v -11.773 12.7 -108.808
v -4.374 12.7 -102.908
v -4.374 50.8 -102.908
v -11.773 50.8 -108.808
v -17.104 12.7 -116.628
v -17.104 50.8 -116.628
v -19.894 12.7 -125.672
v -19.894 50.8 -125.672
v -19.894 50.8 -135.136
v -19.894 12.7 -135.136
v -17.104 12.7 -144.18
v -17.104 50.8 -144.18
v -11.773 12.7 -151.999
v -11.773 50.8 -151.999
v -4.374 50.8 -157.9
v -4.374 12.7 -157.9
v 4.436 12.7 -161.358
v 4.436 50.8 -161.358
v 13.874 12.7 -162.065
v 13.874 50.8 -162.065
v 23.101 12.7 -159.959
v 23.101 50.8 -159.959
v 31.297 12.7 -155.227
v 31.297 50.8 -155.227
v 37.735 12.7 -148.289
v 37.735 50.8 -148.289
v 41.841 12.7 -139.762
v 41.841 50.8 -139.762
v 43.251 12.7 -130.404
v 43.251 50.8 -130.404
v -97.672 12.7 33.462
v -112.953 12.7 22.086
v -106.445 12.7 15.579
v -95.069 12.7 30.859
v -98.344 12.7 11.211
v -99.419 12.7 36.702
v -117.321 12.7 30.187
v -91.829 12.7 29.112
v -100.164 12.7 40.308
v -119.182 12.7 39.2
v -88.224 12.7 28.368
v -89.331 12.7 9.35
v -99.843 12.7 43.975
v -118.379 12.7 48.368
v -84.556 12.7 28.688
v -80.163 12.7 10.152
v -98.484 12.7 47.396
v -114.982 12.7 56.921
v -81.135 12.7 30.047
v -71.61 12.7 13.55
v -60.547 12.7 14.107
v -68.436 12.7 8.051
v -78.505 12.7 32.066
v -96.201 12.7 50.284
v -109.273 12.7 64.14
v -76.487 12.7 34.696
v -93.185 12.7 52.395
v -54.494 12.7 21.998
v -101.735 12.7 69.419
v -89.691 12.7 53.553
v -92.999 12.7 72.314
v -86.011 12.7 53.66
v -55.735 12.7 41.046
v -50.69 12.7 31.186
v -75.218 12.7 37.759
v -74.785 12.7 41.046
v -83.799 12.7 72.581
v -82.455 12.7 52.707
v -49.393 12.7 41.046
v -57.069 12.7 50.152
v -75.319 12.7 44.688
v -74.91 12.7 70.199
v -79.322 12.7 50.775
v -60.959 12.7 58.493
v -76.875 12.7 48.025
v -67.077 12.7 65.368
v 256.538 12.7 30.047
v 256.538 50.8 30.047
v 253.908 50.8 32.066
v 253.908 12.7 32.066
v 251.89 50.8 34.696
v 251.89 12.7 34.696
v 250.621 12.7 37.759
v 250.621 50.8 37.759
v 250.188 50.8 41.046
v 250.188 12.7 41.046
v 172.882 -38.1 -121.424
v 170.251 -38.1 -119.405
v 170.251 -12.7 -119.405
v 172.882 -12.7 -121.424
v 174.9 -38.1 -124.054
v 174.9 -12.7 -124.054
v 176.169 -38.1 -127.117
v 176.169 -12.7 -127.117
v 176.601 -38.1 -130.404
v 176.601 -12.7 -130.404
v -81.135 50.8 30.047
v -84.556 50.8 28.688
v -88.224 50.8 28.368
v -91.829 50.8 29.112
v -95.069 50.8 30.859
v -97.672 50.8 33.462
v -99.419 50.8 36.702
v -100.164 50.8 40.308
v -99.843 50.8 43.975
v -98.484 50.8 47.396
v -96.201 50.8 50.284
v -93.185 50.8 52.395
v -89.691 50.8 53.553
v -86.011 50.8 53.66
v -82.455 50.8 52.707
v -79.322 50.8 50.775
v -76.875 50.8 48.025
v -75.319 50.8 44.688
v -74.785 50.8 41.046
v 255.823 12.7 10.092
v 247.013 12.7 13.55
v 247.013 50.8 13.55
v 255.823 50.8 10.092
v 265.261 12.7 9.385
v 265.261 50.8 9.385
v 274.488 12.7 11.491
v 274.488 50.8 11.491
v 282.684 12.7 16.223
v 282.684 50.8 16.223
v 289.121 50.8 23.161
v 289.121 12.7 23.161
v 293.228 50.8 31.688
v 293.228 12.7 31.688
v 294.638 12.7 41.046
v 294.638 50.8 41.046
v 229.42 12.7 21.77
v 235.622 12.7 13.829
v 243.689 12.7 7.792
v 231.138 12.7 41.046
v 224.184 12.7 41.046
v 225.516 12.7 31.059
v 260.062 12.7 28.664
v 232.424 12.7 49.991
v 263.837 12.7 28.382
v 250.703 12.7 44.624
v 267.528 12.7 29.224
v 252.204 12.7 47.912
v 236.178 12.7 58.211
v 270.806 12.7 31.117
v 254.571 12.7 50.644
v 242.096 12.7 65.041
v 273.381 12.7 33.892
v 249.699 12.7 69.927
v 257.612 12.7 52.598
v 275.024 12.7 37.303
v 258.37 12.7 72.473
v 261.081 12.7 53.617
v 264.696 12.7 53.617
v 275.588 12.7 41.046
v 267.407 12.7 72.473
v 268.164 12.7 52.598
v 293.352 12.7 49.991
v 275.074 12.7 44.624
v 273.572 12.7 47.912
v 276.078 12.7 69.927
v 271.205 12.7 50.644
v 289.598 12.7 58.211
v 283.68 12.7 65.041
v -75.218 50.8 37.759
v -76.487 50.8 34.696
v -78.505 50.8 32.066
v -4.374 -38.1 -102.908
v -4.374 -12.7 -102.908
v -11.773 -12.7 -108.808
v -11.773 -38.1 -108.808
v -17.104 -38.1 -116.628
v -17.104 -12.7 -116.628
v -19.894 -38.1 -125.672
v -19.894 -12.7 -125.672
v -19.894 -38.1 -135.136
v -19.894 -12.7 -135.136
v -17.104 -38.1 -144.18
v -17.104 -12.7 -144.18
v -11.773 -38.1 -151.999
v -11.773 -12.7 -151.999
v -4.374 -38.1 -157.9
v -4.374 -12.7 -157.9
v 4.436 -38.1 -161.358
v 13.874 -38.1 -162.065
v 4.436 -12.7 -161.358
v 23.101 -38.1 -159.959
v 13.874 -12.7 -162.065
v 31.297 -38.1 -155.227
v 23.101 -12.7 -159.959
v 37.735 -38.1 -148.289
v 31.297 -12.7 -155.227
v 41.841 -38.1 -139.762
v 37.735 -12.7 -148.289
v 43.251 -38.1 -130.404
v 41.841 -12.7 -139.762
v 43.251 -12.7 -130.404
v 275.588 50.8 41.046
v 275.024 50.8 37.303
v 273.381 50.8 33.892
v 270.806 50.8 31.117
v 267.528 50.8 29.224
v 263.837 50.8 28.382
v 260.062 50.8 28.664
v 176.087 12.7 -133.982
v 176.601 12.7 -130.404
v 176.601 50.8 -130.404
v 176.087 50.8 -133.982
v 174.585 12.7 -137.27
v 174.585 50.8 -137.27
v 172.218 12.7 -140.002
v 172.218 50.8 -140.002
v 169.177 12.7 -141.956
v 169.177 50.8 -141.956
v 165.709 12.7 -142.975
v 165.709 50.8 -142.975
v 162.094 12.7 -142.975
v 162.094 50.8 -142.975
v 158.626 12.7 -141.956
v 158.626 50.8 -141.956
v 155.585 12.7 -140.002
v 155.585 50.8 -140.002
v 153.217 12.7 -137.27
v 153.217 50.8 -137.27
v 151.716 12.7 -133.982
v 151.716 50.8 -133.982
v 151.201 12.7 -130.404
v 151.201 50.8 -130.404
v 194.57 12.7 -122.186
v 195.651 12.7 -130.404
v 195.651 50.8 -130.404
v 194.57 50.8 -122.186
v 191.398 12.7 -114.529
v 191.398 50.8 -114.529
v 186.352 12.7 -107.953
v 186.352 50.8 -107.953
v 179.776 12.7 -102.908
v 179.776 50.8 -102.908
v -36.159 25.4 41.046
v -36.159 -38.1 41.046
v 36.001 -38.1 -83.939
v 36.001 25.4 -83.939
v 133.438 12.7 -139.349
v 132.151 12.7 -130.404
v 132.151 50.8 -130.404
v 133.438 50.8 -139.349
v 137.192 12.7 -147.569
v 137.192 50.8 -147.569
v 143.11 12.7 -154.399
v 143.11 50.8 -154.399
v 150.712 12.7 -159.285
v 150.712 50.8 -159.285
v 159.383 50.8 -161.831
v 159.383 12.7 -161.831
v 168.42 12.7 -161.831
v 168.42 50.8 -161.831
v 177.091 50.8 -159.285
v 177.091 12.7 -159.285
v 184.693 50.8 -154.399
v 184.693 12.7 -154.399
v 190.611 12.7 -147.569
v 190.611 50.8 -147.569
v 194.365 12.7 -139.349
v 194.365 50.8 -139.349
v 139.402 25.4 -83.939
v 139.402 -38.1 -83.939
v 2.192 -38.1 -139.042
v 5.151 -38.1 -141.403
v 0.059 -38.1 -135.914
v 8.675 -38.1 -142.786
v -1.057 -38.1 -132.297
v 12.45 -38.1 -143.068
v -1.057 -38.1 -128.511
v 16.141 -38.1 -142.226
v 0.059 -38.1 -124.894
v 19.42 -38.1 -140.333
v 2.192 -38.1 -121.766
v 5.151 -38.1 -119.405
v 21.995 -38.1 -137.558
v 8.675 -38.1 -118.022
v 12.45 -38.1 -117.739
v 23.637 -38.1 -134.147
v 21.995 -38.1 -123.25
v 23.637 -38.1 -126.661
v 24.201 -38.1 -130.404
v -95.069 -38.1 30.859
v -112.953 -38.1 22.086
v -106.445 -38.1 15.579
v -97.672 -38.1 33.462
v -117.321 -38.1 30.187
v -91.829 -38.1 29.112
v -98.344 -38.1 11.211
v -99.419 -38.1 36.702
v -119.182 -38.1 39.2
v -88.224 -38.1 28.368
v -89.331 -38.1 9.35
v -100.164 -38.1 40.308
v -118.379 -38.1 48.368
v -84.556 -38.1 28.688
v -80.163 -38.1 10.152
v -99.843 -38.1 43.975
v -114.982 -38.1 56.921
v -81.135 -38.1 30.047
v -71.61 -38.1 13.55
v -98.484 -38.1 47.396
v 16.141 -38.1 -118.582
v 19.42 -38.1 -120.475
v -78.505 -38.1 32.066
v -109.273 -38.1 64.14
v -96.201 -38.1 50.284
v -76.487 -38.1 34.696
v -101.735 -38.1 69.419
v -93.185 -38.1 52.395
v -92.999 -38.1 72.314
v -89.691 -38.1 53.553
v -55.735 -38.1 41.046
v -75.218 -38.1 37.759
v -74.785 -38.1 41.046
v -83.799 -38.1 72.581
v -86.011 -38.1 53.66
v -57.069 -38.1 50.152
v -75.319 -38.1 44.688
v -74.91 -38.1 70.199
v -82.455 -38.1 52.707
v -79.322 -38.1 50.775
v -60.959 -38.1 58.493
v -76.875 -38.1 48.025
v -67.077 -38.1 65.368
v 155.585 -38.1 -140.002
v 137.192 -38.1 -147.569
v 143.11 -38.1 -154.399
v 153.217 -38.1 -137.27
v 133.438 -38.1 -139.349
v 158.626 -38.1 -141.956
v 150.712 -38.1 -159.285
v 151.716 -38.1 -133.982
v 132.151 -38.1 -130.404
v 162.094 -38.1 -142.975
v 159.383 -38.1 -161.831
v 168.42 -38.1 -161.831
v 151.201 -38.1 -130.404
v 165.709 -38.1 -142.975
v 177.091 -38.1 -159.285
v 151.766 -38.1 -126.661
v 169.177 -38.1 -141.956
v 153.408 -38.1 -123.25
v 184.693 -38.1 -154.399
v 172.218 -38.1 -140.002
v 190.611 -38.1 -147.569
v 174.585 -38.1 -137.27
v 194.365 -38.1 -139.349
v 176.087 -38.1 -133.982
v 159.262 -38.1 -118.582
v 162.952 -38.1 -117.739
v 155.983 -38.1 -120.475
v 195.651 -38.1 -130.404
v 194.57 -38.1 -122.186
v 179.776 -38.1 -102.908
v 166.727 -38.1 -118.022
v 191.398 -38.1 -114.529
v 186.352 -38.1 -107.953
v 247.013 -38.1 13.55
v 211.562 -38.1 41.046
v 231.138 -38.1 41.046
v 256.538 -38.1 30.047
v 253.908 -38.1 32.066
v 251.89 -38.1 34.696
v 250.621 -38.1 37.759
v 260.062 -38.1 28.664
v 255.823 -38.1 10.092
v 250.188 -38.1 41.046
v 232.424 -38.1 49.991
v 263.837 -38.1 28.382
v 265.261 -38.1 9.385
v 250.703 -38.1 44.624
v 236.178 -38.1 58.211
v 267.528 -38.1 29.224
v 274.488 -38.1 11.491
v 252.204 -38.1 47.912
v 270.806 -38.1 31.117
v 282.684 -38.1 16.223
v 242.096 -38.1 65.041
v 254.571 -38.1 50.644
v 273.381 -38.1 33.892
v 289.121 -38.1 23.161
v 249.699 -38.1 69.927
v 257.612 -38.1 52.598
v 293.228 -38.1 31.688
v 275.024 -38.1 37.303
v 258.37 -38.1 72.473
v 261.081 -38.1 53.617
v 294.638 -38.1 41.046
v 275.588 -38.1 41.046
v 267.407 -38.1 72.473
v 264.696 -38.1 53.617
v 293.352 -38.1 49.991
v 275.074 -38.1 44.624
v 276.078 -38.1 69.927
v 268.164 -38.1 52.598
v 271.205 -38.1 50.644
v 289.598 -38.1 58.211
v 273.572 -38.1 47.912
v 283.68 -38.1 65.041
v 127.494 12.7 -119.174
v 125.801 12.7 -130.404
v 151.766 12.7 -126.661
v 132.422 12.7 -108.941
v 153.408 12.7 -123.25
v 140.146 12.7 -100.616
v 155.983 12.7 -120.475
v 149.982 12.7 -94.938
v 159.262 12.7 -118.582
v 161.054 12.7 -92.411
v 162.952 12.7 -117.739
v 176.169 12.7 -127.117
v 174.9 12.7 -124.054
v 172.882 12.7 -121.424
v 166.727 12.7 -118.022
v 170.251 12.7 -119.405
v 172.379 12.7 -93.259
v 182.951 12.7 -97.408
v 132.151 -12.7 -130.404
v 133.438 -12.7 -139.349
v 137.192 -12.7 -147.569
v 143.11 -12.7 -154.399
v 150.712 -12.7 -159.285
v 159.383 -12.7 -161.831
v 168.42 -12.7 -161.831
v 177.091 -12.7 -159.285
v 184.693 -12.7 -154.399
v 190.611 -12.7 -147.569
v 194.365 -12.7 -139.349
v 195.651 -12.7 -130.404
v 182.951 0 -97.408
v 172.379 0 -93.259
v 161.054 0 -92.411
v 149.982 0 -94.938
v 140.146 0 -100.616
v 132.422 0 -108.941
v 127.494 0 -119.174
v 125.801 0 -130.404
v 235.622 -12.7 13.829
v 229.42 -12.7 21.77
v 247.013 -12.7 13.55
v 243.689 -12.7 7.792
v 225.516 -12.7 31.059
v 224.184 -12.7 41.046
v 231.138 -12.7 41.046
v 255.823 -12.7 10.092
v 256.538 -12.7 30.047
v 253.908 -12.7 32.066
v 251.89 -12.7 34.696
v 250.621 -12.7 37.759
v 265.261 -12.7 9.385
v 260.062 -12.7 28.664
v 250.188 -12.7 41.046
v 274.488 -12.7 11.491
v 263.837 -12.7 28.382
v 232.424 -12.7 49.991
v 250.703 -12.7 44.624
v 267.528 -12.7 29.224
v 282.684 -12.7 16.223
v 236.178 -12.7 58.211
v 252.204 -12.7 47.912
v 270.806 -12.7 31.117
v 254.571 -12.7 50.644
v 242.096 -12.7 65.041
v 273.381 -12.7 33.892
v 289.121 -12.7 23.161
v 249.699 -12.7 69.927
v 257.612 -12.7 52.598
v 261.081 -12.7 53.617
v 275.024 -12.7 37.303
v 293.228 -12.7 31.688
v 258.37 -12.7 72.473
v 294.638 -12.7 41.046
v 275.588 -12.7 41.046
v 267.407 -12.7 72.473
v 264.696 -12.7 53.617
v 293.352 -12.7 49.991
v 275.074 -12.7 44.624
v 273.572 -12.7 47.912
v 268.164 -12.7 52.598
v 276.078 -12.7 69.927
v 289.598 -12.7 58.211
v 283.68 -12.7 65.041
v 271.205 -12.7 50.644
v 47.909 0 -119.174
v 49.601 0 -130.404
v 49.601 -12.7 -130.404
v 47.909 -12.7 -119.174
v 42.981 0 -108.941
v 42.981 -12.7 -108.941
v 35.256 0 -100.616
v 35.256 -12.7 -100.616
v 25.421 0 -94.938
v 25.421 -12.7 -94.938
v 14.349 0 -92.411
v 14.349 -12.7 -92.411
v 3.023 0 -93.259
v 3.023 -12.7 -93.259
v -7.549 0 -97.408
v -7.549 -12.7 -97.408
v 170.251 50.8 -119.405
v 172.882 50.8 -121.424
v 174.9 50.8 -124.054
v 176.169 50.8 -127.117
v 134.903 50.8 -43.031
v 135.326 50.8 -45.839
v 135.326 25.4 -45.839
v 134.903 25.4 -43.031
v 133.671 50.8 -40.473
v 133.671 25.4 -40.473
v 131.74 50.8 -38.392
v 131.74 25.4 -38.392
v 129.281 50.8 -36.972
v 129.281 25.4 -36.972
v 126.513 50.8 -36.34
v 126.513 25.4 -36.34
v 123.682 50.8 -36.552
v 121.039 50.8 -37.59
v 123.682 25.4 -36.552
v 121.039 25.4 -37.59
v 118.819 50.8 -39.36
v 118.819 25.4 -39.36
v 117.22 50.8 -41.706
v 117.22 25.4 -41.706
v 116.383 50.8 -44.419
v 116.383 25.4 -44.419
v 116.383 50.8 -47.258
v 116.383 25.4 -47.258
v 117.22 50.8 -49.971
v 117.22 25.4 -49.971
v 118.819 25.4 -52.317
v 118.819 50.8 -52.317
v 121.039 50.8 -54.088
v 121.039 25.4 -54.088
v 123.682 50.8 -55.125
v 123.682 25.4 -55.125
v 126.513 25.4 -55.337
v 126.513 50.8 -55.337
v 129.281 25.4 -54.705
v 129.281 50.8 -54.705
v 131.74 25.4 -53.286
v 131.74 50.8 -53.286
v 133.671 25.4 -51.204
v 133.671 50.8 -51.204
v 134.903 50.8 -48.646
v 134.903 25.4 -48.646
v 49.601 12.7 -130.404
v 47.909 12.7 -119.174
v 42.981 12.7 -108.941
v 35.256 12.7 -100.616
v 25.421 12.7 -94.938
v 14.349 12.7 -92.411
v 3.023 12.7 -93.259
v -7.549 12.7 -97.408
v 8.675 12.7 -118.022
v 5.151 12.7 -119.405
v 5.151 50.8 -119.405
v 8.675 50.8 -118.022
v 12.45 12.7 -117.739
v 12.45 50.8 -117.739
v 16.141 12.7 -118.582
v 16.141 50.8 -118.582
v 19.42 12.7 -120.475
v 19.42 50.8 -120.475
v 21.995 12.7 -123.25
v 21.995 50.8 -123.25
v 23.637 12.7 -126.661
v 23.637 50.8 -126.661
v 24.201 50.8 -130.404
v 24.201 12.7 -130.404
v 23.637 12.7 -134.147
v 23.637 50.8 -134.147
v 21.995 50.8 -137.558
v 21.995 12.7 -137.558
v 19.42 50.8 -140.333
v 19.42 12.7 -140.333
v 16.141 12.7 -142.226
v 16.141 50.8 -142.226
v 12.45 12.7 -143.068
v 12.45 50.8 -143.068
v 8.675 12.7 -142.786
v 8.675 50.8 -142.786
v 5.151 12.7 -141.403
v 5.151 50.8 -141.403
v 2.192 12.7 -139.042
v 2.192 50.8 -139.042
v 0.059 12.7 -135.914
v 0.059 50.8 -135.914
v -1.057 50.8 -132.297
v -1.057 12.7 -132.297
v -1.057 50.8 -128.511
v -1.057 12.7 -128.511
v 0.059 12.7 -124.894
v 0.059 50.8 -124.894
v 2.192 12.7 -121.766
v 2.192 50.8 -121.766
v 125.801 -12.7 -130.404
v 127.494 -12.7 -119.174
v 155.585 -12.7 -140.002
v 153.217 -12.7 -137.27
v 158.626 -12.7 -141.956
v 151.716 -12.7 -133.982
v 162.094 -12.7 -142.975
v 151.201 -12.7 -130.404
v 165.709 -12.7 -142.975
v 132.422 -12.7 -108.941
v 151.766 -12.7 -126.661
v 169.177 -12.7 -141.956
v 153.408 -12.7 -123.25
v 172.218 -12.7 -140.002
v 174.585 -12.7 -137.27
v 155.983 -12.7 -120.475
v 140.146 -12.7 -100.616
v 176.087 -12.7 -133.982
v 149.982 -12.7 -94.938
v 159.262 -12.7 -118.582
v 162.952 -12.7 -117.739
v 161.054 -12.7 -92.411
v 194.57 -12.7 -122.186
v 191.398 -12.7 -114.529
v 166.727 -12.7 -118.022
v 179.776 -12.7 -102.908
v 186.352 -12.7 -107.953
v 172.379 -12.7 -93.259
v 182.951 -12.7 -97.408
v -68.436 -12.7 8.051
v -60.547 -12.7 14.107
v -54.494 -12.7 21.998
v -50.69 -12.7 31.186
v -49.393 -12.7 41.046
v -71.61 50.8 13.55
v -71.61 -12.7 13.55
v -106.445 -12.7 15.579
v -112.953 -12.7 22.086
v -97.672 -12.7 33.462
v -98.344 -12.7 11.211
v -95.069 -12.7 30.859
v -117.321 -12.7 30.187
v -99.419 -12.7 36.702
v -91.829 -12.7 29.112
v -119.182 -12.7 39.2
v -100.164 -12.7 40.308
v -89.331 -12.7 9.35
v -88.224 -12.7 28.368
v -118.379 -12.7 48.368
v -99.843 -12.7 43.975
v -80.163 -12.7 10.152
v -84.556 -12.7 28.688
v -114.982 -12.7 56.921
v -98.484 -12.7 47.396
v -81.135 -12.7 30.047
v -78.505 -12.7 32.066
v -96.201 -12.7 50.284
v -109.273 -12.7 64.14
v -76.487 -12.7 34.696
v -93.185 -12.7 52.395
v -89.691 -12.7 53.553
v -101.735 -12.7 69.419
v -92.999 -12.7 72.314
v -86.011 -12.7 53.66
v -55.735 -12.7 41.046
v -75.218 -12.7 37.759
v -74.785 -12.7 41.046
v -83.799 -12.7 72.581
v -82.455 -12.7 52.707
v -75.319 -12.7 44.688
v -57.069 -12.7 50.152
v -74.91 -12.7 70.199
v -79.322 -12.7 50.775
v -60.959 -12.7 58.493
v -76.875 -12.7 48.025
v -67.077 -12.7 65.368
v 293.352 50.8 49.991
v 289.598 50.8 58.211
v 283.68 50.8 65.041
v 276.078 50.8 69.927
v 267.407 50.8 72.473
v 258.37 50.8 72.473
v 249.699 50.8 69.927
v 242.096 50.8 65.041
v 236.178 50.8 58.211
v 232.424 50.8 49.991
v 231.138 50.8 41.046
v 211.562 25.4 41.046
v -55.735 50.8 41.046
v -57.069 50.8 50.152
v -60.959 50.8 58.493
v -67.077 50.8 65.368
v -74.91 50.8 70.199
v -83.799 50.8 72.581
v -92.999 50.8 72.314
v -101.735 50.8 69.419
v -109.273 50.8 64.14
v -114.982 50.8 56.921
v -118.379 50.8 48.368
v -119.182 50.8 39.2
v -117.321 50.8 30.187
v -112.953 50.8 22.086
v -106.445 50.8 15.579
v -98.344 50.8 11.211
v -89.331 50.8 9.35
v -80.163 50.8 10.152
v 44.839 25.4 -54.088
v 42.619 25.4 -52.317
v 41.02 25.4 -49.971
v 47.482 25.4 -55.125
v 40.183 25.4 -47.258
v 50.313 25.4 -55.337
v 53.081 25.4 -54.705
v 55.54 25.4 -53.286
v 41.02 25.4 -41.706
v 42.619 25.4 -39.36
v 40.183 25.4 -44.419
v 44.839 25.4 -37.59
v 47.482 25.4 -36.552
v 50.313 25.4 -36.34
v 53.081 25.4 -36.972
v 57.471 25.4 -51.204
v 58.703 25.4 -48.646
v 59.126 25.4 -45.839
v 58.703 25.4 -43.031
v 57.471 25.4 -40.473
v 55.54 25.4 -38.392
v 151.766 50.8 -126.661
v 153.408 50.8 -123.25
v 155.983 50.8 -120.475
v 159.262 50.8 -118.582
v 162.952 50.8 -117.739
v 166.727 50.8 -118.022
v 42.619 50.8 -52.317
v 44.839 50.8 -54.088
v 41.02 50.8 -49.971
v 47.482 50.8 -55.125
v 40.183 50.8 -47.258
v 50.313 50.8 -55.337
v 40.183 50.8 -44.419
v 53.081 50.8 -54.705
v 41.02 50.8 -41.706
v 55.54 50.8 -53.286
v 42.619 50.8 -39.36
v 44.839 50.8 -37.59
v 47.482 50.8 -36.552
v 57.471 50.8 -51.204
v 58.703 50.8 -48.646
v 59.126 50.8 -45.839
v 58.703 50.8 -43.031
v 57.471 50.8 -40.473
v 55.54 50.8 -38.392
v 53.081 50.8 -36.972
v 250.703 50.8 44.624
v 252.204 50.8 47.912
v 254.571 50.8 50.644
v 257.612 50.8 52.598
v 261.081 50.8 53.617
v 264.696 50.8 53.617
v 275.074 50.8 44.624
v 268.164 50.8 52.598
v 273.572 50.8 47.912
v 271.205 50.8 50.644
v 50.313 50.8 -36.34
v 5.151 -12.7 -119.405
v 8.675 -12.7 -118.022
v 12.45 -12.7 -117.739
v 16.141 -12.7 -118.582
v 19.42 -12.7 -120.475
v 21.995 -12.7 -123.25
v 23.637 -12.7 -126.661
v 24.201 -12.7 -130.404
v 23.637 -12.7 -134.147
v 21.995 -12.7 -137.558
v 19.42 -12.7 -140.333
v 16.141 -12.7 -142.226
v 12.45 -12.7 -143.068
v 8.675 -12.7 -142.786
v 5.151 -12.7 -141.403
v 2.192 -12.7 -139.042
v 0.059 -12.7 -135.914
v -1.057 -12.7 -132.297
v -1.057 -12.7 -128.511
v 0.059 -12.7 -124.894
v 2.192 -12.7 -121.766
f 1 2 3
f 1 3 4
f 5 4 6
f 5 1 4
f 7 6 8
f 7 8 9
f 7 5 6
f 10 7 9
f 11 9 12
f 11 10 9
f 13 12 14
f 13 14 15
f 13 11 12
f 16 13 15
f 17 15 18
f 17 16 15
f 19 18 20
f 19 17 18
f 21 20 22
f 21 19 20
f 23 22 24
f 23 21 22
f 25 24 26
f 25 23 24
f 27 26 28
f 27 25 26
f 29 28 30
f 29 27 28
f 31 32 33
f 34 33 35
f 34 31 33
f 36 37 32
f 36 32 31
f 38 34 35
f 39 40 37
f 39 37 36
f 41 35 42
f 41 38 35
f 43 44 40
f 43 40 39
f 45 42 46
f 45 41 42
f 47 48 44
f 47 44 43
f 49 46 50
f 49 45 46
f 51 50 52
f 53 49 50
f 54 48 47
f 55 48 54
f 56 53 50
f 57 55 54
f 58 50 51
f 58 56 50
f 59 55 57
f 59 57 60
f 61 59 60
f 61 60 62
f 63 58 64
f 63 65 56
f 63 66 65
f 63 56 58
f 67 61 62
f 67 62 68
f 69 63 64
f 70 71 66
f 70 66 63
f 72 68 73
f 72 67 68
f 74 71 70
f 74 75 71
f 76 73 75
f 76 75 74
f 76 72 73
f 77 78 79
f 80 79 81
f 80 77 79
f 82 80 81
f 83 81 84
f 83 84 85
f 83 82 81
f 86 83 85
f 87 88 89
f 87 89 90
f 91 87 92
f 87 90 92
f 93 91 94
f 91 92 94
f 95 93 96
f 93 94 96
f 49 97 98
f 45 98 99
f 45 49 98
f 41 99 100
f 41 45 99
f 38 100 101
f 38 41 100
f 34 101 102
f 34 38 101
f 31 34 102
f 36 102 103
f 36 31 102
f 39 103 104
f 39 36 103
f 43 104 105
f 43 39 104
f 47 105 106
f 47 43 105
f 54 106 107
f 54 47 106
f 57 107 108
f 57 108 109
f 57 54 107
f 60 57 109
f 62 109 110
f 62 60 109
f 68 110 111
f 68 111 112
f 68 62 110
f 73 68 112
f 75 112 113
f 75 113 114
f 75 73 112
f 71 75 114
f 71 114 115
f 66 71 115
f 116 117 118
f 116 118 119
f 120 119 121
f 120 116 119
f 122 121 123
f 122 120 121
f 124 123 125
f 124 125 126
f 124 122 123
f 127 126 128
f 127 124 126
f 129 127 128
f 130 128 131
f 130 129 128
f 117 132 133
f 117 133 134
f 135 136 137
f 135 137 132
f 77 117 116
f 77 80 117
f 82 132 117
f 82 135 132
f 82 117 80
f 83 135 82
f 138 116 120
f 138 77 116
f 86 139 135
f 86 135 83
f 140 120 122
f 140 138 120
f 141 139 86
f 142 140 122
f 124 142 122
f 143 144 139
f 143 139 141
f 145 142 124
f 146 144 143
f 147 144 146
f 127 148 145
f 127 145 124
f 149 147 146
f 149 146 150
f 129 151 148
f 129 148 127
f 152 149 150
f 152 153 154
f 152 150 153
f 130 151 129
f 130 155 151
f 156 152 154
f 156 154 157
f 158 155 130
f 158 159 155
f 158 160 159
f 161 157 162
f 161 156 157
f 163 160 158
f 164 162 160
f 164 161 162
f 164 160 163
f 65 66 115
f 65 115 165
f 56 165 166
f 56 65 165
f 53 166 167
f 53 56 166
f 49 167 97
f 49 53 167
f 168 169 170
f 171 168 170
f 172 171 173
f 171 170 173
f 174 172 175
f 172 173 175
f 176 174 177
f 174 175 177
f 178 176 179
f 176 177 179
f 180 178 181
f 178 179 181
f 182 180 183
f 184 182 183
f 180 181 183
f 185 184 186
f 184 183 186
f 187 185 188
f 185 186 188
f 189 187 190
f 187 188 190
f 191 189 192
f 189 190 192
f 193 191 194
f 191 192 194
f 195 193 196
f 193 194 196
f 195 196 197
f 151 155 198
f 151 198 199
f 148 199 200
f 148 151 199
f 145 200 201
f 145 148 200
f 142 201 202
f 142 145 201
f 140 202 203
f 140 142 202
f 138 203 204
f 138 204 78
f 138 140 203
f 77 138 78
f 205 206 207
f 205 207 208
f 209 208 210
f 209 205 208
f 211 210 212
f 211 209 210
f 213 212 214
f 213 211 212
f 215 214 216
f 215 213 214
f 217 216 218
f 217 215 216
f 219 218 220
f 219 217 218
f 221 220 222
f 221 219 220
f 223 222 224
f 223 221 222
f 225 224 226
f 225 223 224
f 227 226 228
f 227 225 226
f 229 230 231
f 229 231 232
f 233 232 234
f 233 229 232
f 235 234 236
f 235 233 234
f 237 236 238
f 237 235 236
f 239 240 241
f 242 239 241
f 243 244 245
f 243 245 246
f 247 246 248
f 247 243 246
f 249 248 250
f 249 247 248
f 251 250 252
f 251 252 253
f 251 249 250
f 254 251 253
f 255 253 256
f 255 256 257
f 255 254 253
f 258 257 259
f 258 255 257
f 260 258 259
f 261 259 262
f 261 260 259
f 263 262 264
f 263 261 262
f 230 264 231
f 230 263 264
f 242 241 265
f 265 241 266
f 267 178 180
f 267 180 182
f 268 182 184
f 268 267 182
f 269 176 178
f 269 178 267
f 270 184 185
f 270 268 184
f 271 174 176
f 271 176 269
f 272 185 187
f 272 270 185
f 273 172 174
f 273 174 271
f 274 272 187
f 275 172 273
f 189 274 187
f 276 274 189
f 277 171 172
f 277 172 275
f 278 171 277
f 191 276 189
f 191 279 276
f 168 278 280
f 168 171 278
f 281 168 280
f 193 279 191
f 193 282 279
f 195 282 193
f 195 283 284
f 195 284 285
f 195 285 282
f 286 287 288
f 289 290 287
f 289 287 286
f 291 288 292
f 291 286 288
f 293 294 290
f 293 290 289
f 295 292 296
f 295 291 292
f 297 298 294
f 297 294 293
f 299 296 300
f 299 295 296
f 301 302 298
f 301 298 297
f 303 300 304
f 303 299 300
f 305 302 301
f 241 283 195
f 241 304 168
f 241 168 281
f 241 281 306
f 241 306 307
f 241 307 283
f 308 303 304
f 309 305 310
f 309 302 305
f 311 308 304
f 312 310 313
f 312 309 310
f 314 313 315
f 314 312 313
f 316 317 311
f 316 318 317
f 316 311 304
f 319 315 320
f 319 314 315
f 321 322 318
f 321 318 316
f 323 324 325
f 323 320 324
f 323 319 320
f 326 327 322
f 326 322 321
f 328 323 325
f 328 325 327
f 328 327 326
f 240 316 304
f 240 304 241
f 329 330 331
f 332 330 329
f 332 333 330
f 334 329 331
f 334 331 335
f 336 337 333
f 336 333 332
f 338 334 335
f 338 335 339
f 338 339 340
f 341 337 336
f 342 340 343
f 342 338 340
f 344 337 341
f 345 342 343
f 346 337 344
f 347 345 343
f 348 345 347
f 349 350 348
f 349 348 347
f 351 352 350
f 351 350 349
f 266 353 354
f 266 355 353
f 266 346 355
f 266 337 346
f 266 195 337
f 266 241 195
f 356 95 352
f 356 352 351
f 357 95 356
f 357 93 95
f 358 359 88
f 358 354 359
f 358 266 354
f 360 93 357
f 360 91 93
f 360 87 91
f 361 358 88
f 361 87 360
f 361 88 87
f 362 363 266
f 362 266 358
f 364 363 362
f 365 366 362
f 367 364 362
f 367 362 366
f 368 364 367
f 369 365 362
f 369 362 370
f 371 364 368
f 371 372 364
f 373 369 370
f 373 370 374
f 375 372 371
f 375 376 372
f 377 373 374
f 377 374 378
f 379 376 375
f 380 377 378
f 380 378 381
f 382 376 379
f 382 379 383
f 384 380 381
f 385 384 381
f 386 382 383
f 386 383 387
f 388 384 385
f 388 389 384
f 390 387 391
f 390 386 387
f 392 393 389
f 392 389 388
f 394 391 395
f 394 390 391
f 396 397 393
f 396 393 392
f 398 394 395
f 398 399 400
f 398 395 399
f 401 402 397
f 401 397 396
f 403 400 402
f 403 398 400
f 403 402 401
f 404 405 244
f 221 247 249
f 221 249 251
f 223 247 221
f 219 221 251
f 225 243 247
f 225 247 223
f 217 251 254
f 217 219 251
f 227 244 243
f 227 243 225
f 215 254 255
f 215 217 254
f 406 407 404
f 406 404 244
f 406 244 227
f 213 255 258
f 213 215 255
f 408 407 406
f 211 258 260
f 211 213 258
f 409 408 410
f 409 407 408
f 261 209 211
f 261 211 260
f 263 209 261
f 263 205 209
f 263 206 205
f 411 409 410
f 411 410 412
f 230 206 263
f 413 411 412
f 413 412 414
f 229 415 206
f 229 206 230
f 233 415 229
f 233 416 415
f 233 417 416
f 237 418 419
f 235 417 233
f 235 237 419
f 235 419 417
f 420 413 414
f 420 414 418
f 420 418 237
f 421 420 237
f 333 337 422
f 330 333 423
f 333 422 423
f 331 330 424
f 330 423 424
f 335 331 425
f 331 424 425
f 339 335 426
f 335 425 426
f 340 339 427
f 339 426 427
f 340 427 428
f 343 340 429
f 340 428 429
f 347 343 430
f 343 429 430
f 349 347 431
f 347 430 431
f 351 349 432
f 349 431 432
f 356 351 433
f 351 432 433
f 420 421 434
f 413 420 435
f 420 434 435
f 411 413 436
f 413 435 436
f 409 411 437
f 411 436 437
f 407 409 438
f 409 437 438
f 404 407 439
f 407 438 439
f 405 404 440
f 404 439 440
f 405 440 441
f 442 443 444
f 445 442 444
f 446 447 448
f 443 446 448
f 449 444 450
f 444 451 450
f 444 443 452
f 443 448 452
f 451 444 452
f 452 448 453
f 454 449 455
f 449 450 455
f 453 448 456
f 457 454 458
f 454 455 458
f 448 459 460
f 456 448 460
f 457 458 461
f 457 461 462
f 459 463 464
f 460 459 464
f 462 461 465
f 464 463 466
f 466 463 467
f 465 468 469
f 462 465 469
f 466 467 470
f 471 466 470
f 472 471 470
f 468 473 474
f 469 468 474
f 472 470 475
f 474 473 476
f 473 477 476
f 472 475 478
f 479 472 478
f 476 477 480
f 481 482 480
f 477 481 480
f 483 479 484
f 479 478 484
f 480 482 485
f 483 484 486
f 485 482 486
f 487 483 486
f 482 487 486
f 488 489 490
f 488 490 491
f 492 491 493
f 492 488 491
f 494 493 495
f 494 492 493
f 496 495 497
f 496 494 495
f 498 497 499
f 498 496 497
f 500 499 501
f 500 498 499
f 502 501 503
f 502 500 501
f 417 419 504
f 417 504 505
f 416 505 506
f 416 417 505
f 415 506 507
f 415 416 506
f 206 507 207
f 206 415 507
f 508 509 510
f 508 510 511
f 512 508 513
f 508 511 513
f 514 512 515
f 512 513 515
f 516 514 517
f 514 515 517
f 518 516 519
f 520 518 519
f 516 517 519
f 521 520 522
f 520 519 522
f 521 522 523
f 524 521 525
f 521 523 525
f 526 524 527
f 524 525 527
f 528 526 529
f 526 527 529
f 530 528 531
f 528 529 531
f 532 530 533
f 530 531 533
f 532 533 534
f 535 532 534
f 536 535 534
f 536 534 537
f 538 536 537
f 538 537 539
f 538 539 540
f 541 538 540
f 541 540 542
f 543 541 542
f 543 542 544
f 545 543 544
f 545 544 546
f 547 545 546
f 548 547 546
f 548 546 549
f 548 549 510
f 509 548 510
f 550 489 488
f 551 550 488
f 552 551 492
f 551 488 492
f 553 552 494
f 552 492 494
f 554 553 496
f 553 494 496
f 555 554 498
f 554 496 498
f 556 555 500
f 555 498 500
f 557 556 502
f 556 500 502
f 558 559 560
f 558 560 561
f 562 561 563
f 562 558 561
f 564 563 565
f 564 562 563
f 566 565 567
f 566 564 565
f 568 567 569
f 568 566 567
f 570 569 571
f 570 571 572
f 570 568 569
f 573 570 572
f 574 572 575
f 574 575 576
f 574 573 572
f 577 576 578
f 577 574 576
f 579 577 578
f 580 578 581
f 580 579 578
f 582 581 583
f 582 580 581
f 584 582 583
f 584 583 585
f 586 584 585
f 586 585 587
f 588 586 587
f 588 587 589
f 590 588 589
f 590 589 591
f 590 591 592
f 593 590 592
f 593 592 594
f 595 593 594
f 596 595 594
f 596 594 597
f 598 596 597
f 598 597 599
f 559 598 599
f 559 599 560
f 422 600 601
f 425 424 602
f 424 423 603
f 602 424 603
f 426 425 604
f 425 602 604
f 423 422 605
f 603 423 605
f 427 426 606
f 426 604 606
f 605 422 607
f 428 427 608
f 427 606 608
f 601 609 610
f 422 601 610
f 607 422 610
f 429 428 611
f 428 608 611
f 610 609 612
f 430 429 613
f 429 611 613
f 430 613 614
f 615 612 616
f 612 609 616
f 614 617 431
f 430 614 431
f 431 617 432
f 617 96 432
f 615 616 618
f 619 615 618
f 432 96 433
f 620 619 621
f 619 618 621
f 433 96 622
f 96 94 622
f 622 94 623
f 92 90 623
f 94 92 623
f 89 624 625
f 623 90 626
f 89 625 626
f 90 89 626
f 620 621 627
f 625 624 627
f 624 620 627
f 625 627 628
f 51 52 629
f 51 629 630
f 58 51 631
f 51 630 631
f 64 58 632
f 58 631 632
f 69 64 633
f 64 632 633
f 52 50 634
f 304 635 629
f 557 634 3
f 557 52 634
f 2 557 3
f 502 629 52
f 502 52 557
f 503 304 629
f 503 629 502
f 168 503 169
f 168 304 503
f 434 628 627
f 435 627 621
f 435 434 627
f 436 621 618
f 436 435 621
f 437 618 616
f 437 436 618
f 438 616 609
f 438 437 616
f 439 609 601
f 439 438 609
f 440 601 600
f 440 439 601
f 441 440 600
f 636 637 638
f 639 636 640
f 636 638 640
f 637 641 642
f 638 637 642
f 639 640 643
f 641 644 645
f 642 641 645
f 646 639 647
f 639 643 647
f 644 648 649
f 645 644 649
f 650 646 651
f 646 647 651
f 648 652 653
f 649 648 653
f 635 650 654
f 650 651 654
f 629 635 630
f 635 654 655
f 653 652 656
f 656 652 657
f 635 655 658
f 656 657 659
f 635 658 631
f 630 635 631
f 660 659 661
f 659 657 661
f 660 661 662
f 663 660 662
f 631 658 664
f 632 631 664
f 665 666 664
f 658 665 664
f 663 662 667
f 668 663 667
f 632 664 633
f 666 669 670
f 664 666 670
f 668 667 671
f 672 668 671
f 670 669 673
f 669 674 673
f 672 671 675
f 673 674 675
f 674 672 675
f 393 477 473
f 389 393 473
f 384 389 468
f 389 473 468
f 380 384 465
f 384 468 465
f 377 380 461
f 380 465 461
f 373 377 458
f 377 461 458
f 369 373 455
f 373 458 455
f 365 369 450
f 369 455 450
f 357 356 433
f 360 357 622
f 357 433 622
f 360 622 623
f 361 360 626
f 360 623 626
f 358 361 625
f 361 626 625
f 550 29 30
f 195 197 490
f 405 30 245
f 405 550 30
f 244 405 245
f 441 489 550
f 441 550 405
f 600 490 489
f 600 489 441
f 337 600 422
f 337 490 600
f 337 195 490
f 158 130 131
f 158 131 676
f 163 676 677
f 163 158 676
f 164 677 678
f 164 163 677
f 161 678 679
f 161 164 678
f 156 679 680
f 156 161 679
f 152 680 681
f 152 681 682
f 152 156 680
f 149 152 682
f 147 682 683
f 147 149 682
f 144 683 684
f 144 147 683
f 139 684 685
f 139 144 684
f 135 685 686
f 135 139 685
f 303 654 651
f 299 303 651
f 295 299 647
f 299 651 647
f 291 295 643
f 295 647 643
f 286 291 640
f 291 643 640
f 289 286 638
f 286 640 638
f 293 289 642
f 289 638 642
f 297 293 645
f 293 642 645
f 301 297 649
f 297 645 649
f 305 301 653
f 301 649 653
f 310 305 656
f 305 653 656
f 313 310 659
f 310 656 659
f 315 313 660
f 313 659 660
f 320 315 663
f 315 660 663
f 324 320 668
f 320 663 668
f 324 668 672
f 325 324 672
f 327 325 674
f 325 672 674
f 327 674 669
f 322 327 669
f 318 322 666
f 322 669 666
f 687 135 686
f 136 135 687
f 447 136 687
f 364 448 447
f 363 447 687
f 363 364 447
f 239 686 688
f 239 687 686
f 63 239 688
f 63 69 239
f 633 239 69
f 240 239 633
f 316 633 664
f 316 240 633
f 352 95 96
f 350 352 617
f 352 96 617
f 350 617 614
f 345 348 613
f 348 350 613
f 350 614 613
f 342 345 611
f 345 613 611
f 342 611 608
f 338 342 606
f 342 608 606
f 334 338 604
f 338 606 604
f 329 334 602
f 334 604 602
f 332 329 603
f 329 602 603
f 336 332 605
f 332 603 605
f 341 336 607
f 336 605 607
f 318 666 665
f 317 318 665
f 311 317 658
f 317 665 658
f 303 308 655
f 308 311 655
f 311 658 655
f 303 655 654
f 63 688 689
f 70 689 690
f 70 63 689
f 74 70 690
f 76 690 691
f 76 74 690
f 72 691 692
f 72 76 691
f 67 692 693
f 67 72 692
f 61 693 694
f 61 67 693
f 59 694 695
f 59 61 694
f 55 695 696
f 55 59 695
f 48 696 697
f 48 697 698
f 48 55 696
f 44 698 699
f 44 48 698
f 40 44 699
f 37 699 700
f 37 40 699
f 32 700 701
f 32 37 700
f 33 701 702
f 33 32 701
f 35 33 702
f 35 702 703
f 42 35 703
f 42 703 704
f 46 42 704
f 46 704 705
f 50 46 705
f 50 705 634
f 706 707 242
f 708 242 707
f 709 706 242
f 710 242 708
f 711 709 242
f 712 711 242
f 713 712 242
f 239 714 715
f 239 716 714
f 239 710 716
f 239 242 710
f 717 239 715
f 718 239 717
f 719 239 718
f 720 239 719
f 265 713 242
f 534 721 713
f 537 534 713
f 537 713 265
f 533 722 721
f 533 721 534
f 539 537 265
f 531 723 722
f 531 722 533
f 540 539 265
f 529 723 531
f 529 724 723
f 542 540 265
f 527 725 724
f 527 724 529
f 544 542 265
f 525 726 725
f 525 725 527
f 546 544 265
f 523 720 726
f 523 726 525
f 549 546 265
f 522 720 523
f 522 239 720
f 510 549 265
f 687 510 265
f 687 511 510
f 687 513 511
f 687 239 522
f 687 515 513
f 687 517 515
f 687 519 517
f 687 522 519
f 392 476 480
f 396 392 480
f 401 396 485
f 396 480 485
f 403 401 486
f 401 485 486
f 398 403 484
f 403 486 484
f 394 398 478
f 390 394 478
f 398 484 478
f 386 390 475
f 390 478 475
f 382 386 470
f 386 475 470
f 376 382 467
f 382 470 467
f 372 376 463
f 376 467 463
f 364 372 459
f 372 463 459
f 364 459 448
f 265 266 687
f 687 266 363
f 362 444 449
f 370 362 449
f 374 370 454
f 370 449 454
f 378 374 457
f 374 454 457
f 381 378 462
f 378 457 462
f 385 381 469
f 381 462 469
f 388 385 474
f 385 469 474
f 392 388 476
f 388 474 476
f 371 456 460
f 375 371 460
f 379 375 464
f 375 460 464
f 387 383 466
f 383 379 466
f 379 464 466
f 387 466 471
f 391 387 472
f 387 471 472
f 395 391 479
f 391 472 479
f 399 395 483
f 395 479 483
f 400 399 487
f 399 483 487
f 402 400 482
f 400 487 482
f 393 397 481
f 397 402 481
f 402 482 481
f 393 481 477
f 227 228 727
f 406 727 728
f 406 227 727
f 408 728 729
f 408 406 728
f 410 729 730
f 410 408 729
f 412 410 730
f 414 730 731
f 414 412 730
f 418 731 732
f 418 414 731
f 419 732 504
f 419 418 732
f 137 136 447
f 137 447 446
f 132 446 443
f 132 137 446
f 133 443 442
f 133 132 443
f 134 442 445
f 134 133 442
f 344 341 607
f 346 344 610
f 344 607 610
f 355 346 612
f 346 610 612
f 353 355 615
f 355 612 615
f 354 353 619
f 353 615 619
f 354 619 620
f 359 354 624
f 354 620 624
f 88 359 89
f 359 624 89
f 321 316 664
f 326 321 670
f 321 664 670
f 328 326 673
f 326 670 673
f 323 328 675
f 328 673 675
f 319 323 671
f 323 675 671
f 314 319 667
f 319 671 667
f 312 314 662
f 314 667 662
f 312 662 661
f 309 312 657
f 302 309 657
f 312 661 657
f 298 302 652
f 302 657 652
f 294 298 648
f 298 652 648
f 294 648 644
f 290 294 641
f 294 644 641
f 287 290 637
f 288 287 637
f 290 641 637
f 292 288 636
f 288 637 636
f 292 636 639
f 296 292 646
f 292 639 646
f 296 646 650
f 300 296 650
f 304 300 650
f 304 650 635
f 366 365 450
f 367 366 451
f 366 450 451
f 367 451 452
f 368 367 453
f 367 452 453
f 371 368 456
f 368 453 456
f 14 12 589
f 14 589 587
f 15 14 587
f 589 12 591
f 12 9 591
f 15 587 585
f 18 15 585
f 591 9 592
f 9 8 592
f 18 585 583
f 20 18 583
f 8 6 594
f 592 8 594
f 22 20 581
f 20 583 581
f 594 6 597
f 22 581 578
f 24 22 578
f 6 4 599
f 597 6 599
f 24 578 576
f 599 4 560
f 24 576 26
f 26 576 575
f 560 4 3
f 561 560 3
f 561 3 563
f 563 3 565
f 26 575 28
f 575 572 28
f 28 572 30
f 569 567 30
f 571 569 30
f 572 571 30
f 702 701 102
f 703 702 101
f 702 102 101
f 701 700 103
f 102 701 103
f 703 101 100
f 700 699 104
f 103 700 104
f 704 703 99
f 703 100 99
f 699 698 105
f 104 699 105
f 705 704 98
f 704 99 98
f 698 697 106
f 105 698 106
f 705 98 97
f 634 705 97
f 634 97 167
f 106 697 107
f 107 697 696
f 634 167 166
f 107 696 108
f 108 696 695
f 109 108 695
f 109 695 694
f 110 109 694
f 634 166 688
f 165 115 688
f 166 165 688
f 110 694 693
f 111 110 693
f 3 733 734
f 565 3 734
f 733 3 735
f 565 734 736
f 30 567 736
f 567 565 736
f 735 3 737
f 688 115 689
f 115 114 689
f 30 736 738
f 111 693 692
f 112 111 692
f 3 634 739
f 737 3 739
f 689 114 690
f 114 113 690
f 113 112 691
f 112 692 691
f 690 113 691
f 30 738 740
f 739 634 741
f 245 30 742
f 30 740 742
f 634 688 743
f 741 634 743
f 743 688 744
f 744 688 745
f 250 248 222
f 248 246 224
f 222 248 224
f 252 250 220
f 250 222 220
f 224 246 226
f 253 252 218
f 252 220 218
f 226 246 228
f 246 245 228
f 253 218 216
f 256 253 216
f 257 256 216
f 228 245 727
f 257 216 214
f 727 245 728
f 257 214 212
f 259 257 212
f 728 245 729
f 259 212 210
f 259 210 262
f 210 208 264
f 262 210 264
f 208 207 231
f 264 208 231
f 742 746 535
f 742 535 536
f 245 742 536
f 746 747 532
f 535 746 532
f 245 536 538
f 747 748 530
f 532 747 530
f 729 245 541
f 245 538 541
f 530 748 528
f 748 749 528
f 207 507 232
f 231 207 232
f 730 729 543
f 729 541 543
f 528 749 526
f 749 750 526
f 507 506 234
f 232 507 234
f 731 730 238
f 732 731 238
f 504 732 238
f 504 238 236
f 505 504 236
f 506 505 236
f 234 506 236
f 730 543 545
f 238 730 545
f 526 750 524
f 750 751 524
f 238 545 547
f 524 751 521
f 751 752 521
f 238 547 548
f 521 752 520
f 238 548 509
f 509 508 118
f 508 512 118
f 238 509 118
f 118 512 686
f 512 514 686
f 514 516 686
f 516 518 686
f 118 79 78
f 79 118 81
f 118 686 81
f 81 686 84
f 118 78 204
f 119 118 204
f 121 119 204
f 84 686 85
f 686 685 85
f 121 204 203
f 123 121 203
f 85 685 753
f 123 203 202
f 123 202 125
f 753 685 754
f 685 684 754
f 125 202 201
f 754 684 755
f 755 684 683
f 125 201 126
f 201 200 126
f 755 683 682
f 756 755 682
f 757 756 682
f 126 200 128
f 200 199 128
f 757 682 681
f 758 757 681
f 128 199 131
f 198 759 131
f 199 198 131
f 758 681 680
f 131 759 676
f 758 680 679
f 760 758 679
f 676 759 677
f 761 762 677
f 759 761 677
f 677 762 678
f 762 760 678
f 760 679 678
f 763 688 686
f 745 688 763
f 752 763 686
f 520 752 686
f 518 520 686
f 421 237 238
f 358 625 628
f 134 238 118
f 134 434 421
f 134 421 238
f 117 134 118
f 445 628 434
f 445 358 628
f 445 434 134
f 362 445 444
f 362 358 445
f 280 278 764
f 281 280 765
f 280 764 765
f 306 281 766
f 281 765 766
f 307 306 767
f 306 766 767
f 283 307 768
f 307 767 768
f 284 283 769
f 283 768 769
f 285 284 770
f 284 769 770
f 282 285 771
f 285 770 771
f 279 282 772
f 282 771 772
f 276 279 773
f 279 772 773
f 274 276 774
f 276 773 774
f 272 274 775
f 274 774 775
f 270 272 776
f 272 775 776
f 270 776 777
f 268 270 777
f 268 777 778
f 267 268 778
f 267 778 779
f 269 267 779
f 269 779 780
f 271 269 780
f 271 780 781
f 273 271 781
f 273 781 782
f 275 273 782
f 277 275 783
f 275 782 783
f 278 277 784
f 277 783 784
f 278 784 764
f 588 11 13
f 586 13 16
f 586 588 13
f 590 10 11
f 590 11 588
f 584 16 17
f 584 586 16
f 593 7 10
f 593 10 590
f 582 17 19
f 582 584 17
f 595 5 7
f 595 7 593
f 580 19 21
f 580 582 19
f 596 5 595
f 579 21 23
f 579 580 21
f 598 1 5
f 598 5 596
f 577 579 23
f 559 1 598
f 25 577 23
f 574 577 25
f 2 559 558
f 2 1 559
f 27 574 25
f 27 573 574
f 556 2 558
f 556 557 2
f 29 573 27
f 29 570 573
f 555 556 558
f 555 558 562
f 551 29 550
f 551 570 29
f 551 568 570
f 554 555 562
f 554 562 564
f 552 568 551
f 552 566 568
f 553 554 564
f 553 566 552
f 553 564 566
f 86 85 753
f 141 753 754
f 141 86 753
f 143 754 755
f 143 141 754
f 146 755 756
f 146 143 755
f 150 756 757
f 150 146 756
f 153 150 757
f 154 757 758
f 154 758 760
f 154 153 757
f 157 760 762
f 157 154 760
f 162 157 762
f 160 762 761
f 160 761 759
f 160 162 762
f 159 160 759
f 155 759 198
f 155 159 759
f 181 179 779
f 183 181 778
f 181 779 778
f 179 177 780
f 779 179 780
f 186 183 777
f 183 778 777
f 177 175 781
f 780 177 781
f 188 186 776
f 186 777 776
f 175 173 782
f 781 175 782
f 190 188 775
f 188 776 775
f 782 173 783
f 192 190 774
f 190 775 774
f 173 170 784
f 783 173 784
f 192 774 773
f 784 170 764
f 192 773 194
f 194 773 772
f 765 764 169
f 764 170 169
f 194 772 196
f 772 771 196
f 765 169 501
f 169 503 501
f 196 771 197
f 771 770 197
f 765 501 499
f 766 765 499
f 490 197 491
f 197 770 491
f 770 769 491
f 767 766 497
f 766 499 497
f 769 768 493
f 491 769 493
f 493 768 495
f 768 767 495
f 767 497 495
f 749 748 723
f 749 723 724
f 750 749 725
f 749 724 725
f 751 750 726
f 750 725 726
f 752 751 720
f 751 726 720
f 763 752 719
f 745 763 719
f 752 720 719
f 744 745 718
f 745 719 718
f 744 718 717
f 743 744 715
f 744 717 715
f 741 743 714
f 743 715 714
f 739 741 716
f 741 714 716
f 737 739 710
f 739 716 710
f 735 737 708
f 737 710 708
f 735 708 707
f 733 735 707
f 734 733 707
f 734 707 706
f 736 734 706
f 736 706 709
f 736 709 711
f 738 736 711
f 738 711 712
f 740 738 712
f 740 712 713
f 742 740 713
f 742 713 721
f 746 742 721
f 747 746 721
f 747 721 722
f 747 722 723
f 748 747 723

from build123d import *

# Parameters (mm, degrees)
F1_DEPTH  = 50.8
F3_DEPTH  = 76.2
F4_R      = 38.1
F1_FACE_R = 12.7
F5_DEPTH  = 12.7
F6_R      = 9.525
F7_DEPTH  = 25.401


with BuildPart() as f1:
    # F0 (on Front) → F1 (new body, symmetric)
    with BuildSketch(Plane.XZ):
        with BuildLine():
            ThreePointArc((-81.1352841451, 30.047498821), (-98.4838067731, 47.3960214491), (-74.7852841451, 41.0460214491))
            Line((-74.7852841451, 41.0460214491), (-55.7352841451, 41.0460214491))
            ThreePointArc((-55.7352841451, 41.0460214491), (-114.9815907152, 56.9210214491), (-71.6102841451, 13.5497148789))
            Line((-71.6102841451, 13.5497148789), (-81.1352841451, 30.047498821))
        make_face()
        with BuildLine():
            ThreePointArc((294.63812316, 41.0460214491), (262.88812316, 72.7960214491), (231.13812316, 41.0460214491))
            Line((231.13812316, 41.0460214491), (250.18812316, 41.0460214491))
            ThreePointArc((250.18812316, 41.0460214491), (262.88812316, 53.7460214491), (275.58812316, 41.0460214491))
            ThreePointArc((275.58812316, 41.0460214491), (269.23812316, 30.047498821), (256.53812316, 30.047498821))
            Line((256.53812316, 30.047498821), (247.01312316, 13.5497148789))
            ThreePointArc((247.01312316, 13.5497148789), (278.76312316, 13.5497148789), (294.63812316, 41.0460214491))
        make_face()
        with BuildLine():
            ThreePointArc((195.6514195075, -130.4039785509), (191.3977260776, -114.5289785509), (179.7764195075, -102.9076719808))
            Line((179.7764195075, -102.9076719808), (170.2514195075, -119.4054559229))
            ThreePointArc((170.2514195075, -119.4054559229), (174.8999421355, -124.0539785509), (176.6014195075, -130.4039785509))
            ThreePointArc((176.6014195075, -130.4039785509), (163.9014195075, -143.1039785509), (151.2014195075, -130.4039785509))
            Line((151.2014195075, -130.4039785509), (132.1514195075, -130.4039785509))
            ThreePointArc((132.1514195075, -130.4039785509), (163.9014195075, -162.1539785509), (195.6514195075, -130.4039785509))
        make_face()
        with BuildLine():
            Line((5.1514195075, -119.4054559229), (-4.3735804925, -102.9076719808))
            ThreePointArc((-4.3735804925, -102.9076719808), (-4.3735804925, -157.9002851211), (43.2514195075, -130.4039785509))
            Line((43.2514195075, -130.4039785509), (24.2014195075, -130.4039785509))
            ThreePointArc((24.2014195075, -130.4039785509), (5.1514195075, -141.402501179), (5.1514195075, -119.4054559229))
        make_face()
        with BuildLine():
            ThreePointArc((43.2514195075, -130.4039785509), (27.3764195075, -102.9076719808), (-4.3735804925, -102.9076719808))
            Line((-4.3735804925, -102.9076719808), (5.1514195075, -119.4054559229))
            ThreePointArc((5.1514195075, -119.4054559229), (17.8514195075, -119.4054559229), (24.2014195075, -130.4039785509))
            Line((24.2014195075, -130.4039785509), (43.2514195075, -130.4039785509))
        make_face()
        with BuildLine():
            Line((-55.7352841451, 41.0460214491), (-74.7852841451, 41.0460214491))
            ThreePointArc((-74.7852841451, 41.0460214491), (-76.486761517, 34.6960214491), (-81.1352841451, 30.047498821))
            Line((-81.1352841451, 30.047498821), (-71.6102841451, 13.5497148789))
            ThreePointArc((-71.6102841451, 13.5497148789), (-59.9889775749, 25.1710214491), (-55.7352841451, 41.0460214491))
        make_face()
        with BuildLine():
            Line((250.18812316, 41.0460214491), (231.13812316, 41.0460214491))
            ThreePointArc((231.13812316, 41.0460214491), (235.3918165899, 25.1710214491), (247.01312316, 13.5497148789))
            Line((247.01312316, 13.5497148789), (256.53812316, 30.047498821))
            ThreePointArc((256.53812316, 30.047498821), (251.889600532, 34.6960214491), (250.18812316, 41.0460214491))
        make_face()
        with BuildLine():
            Line((170.2514195075, -119.4054559229), (179.7764195075, -102.9076719808))
            ThreePointArc((179.7764195075, -102.9076719808), (148.0264195075, -102.9076719808), (132.1514195075, -130.4039785509))
            Line((132.1514195075, -130.4039785509), (151.2014195075, -130.4039785509))
            ThreePointArc((151.2014195075, -130.4039785509), (157.5514195075, -119.4054559229), (170.2514195075, -119.4054559229))
        make_face()
        with BuildLine():
            Line((231.13812316, 41.0460214491), (-55.7352841451, 41.0460214491))
            ThreePointArc((-55.7352841451, 41.0460214491), (-59.9889775749, 25.1710214491), (-71.6102841451, 13.5497148789))
            Line((-71.6102841451, 13.5497148789), (-4.3735804925, -102.9076719808))
            ThreePointArc((-4.3735804925, -102.9076719808), (27.3764195075, -102.9076719808), (43.2514195075, -130.4039785509))
            Line((43.2514195075, -130.4039785509), (132.1514195075, -130.4039785509))
            ThreePointArc((132.1514195075, -130.4039785509), (148.0264195075, -102.9076719808), (179.7764195075, -102.9076719808))
            Line((179.7764195075, -102.9076719808), (247.01312316, 13.5497148789))
            ThreePointArc((247.01312316, 13.5497148789), (235.3918165899, 25.1710214491), (231.13812316, 41.0460214491))
        make_face()
    extrude(amount=F1_DEPTH, both=True)

    # F2 (on face) → F3 (cut)
    with BuildSketch(Plane.XZ.offset(50.8)):
        Polygon((211.5616842291, 41.0460214491), (-36.1588452141, 41.0460214491), (36.0010718467, -83.9386211703), (139.4017671682, -83.9386211703), align=None)
    extrude(amount=-F3_DEPTH, mode=Mode.SUBTRACT)

    # F4 (on Front) + F1_face (on face) → F5 (cut, symmetric)
    with BuildSketch(Plane.XZ):
        with Locations((-87.4930471182, 41.0424880683)):
            Circle(F4_R)
        with Locations((262.2837722301, 41.0460214491)):
            Circle(F4_R)
        with Locations((163.9014195075, -130.4039785509)):
            Circle(F4_R)
        with Locations((11.5014195075, -130.4039785509)):
            Circle(F4_R)
    with BuildSketch(Plane(origin=(87.7014195075, -50.8, -33.7225685026), x_dir=(1, 0, 0), z_dir=(0, -1, 0))):
        with BuildLine():
            Line((-123.8602647216, 74.7685899517), (-143.4367036526, 74.7685899517))
            ThreePointArc((-143.4367036526, 74.7685899517), (-202.6830102227, 90.6435899517), (-159.3117036526, 47.2722833815))
            Line((-159.3117036526, 47.2722833815), (-92.075, -69.1851034782))
            ThreePointArc((-92.075, -69.1851034782), (-92.075, -124.1777166185), (-44.45, -96.6814100483))
            Line((-44.45, -96.6814100483), (44.45, -96.6814100483))
            ThreePointArc((44.45, -96.6814100483), (92.075, -124.1777166185), (92.075, -69.1851034782))
            Line((92.075, -69.1851034782), (159.3117036526, 47.2722833815))
            ThreePointArc((159.3117036526, 47.2722833815), (202.6830102227, 90.6435899517), (143.4367036526, 74.7685899517))
            Line((143.4367036526, 74.7685899517), (123.8602647216, 74.7685899517))
            Line((123.8602647216, 74.7685899517), (51.7003476608, -50.2160526677))
            Line((51.7003476608, -50.2160526677), (-51.7003476608, -50.2160526677))
            Line((-51.7003476608, -50.2160526677), (-123.8602647216, 74.7685899517))
        make_face()
        with Locations((-76.2, -96.6814100483)):
            Circle(F1_FACE_R, mode=Mode.SUBTRACT)
        with Locations((76.2, -96.6814100483)):
            Circle(F1_FACE_R, mode=Mode.SUBTRACT)
        with Locations((-175.1867036526, 74.7685899517)):
            Circle(F1_FACE_R, mode=Mode.SUBTRACT)
        with Locations((175.1867036526, 74.7685899517)):
            Circle(F1_FACE_R, mode=Mode.SUBTRACT)
    extrude(amount=F5_DEPTH, both=True, mode=Mode.SUBTRACT)

    # F6 (on face) → F7 (cut, through all)
    with BuildSketch(Plane.XZ.offset(-25.4)):
        with Locations((49.6014195075, -45.8386211703)):
            Circle(F6_R)
        with Locations((125.8014195075, -45.8386211703)):
            Circle(F6_R)
    extrude(amount=-F7_DEPTH, mode=Mode.SUBTRACT)


solid = f1.part
